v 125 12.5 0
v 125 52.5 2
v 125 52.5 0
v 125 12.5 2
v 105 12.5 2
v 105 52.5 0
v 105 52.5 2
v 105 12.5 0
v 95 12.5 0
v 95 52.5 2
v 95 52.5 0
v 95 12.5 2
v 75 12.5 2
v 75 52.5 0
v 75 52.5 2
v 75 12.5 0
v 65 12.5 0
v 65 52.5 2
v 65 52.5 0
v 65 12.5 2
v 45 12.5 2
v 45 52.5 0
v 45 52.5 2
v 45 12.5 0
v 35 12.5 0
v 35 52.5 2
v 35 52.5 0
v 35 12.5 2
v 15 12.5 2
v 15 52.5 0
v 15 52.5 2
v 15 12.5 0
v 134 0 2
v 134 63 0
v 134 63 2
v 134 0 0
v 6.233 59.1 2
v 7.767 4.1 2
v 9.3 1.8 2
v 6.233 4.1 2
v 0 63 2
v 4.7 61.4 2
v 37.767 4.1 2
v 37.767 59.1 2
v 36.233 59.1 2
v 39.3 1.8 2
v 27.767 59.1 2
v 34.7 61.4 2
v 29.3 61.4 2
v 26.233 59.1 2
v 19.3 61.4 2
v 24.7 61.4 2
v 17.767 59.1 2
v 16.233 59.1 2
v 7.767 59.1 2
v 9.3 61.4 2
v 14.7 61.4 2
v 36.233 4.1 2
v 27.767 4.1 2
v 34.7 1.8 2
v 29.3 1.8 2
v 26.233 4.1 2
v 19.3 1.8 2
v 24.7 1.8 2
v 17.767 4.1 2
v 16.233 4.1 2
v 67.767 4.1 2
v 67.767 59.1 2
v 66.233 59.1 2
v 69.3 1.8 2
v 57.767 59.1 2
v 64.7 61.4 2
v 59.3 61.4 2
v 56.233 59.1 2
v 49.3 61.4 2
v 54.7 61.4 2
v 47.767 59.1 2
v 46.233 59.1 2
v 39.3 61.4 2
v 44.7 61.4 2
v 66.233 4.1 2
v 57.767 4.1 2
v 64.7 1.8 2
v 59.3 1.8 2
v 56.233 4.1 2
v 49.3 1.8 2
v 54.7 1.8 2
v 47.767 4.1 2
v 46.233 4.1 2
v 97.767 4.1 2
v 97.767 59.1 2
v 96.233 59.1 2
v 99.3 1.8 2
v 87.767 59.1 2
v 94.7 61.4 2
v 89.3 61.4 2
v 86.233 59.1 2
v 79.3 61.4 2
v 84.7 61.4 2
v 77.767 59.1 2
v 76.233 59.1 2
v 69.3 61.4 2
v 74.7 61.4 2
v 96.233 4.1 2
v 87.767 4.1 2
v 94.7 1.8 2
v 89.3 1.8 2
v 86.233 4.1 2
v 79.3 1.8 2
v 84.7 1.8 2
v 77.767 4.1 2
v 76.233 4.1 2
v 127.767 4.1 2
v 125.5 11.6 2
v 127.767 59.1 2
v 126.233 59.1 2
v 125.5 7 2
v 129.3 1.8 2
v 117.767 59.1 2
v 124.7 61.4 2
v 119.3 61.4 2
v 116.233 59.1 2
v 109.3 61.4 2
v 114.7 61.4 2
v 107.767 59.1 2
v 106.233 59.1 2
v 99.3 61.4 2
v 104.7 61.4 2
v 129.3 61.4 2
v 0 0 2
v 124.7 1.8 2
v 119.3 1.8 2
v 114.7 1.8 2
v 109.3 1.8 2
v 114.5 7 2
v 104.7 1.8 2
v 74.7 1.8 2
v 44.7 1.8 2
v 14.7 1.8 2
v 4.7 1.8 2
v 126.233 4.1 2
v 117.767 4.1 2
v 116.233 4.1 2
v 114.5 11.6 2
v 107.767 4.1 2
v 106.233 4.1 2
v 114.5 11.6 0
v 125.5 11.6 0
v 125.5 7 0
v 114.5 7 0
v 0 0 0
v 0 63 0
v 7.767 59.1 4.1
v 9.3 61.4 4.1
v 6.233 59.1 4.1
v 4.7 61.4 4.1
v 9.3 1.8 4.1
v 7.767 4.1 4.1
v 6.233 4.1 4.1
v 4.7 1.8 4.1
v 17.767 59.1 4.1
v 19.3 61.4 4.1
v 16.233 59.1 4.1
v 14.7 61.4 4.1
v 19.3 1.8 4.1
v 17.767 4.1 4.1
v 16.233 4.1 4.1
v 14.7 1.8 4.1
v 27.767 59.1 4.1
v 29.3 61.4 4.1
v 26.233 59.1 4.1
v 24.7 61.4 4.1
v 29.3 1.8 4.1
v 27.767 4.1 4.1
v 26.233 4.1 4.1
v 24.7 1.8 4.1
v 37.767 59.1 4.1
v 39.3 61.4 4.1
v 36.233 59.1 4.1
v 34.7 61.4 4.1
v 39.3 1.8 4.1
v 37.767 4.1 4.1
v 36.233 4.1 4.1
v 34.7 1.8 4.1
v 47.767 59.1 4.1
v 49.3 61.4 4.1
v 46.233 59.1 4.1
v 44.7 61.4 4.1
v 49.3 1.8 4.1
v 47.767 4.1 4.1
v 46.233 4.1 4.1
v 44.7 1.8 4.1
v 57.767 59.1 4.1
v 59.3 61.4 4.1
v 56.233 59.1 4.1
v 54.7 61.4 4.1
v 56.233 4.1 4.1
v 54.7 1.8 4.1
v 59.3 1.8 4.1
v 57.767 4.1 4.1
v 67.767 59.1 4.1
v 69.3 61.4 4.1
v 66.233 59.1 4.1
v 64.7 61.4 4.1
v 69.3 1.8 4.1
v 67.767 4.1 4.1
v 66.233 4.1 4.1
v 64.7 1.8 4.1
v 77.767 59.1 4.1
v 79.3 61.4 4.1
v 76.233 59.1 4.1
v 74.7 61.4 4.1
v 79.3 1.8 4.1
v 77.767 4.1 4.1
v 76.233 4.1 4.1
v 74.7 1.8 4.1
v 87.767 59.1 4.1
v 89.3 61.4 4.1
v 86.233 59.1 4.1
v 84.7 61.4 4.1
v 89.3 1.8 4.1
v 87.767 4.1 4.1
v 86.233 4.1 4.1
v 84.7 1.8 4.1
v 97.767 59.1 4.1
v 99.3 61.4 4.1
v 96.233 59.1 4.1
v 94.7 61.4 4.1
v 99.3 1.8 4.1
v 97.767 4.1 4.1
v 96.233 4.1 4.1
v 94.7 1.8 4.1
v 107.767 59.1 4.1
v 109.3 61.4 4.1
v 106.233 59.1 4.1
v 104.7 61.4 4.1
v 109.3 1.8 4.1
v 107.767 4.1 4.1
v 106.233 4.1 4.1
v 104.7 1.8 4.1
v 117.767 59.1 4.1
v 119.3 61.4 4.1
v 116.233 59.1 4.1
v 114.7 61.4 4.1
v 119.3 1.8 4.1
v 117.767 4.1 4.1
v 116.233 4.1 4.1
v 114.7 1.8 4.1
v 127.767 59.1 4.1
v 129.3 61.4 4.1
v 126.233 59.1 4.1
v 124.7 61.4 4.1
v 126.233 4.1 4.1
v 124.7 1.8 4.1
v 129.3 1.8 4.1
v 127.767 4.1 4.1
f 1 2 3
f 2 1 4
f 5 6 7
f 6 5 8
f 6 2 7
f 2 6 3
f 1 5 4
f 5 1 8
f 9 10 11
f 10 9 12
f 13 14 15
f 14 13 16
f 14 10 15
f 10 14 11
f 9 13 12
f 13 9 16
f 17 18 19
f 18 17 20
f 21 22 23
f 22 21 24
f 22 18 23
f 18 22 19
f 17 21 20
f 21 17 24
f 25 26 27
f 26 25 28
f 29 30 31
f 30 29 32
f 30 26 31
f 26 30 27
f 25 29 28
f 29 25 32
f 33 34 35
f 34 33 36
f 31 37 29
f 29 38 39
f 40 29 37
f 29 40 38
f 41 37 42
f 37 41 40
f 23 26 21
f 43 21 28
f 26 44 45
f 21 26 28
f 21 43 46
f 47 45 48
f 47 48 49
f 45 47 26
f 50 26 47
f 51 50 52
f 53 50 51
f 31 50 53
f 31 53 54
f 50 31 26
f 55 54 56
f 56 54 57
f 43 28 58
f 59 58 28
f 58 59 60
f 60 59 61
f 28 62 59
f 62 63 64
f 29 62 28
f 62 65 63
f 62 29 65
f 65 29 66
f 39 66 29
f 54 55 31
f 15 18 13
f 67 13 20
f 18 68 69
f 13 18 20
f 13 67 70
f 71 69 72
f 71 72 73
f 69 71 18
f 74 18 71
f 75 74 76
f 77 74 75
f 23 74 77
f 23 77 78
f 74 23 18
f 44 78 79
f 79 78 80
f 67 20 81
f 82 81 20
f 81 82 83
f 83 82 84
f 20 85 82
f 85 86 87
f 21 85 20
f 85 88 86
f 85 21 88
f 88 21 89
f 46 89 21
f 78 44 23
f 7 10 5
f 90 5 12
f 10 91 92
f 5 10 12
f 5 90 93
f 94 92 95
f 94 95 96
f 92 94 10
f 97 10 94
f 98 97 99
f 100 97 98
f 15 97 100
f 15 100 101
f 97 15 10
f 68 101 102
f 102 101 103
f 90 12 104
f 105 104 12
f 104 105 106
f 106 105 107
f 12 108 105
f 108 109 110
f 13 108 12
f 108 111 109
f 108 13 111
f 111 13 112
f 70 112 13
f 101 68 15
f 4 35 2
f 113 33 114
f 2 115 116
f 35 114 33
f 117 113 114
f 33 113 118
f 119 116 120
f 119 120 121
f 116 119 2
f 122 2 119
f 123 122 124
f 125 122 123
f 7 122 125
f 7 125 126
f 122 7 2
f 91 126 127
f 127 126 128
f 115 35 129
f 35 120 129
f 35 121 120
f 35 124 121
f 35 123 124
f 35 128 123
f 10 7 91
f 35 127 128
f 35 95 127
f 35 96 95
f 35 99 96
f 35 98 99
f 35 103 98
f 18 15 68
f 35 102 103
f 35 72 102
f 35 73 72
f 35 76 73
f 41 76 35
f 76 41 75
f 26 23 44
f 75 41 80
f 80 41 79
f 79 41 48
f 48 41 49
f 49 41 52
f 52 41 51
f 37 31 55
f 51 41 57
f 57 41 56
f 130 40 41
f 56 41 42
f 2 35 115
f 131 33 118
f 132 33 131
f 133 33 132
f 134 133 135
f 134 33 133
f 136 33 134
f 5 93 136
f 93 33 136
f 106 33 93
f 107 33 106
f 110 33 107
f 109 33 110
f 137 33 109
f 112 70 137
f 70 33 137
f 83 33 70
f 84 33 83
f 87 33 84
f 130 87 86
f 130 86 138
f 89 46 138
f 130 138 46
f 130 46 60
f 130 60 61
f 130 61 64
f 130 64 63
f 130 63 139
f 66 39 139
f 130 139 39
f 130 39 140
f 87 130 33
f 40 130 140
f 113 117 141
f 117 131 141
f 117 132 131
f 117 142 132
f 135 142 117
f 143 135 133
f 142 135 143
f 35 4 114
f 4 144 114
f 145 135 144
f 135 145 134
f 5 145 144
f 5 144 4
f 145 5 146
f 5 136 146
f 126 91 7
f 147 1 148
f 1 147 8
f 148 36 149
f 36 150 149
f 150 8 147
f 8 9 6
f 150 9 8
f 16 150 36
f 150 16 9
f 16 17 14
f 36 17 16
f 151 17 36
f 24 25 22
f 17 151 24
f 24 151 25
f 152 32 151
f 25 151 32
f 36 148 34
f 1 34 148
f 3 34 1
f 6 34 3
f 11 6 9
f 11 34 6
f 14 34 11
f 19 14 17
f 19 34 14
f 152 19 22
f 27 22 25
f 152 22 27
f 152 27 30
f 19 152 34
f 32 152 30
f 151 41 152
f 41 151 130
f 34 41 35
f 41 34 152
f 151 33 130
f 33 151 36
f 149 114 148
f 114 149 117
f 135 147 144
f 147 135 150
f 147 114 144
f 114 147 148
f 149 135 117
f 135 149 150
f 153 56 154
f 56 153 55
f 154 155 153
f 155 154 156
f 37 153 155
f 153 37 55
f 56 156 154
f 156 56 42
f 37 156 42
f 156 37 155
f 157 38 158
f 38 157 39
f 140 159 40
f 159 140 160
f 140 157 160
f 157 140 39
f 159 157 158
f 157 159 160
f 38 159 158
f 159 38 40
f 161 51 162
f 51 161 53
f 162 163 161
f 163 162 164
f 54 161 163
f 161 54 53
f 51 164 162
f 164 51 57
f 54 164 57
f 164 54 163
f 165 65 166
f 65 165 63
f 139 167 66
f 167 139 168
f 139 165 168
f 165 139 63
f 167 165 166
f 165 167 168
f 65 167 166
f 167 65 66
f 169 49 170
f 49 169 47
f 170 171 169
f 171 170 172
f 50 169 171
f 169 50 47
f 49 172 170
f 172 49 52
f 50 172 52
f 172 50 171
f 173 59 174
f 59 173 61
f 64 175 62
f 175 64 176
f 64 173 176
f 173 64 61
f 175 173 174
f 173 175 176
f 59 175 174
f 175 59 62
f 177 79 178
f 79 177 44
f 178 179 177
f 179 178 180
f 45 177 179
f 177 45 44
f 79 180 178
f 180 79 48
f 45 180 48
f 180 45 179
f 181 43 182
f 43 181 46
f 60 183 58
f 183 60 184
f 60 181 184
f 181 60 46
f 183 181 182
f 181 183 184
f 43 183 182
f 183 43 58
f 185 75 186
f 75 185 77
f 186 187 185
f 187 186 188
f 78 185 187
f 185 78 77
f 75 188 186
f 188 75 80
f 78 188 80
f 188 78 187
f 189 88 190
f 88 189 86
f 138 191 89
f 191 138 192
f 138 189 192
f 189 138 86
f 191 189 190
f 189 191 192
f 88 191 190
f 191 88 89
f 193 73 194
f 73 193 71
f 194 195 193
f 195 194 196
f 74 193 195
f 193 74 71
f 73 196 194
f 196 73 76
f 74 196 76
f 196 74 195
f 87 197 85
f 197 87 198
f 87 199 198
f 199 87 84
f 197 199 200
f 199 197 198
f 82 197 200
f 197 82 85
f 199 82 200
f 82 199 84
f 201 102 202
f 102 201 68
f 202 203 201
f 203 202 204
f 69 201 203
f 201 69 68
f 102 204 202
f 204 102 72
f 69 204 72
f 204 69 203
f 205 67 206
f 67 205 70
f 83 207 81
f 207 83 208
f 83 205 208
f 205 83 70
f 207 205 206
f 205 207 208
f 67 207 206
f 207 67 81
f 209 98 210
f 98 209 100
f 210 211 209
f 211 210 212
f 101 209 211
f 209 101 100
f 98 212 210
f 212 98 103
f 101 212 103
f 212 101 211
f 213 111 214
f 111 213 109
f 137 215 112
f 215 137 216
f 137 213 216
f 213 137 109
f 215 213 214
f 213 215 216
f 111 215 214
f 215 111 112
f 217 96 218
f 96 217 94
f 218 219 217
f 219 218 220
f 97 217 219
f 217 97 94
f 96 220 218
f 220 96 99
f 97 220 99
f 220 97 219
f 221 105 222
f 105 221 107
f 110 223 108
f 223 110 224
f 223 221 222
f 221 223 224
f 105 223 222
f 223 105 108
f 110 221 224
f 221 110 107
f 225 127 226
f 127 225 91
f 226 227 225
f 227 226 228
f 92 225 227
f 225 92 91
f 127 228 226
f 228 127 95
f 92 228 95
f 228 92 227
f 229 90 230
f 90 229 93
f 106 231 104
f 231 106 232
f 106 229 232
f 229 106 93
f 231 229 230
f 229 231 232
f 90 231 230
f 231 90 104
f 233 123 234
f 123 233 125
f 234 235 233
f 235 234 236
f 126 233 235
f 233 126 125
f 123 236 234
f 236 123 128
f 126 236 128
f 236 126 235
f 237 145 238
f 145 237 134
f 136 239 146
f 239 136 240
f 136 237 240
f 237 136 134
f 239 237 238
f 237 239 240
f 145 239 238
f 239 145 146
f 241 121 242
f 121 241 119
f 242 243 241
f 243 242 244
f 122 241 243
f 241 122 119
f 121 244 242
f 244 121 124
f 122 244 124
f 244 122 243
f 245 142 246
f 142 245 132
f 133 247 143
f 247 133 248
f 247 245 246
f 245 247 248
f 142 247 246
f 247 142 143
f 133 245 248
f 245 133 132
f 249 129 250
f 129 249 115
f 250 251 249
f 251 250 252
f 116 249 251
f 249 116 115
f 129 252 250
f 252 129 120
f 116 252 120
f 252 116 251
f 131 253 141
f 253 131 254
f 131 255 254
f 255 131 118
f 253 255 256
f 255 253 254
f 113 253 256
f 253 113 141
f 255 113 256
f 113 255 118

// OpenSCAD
// file: display_spacer.scad
include <common.scad>
include <display_config.scad>
use <display.scad>
include <generic_board.scad>
include <dovetail.scad>
include <display_support_config.scad>

module display_spacer() {
    $fn=50;
    difference() {
        cylinder(display_support_spacing, d=bigscrew_head_diameter);
        translate([0,0,-margin/2]) cylinder(display_support_spacing+margin, d=bigscrew_diameter);
    }
}

display_spacer();
// file: generic_board.scad
include <dovetail.scad>;
include <board_config.scad>;
include <common.scad>;


hole_spacing=10;
front_back_holes_depth=10;

module generic_board_attacher_mating() {
    difference() {
        cube([board_attacher_width,board_attacher_length,board_attacher_height]);
        // non attaching holes
        
        for (z=[1:board_attacher_height/(hole_spacing/2)-1]) translate([0,0,hole_spacing/2*z]) union() {
            /*for (i=[1:board_attacher_length/hole_spacing-1]) 
                translate([-margin,hole_spacing*i,0]) rotate([0,90,0]) 
                    cylinder(board_attacher_width+2*margin,d=bigscrew_diameter, $fn=50);*/
            for (i=[1:board_attacher_length/(hole_spacing/2)]) 
                translate([-margin,hole_spacing*i/2-hole_spacing/4,0]) rotate([0,90,0]) 
                    cylinder(board_attacher_width+2*margin,d=bigscrew_attach_hole_diameter, $fn=50);                
        }
        // vertical attaching holes
        for (i=[1:board_attacher_height/(hole_spacing/2)-1]) 
            union() {
                translate([board_attacher_width/2,front_back_holes_depth+margin,hole_spacing*i/2]) rotate([90,00,0]) 
                    cylinder(front_back_holes_depth+2*margin,d=bigscrew_attach_hole_diameter, $fn=50);             
                translate([board_attacher_width/2,board_attacher_length+margin,hole_spacing*i/2]) rotate([90,00,0]) 
                    cylinder(front_back_holes_depth+2*margin,d=bigscrew_attach_hole_diameter, $fn=50);             
            }
                
    }
}

module generic_board_attacher() {
    union() {
        generic_board_attacher_mating();
        translate([board_attacher_width/2,board_attacher_length,0]) rail(true, rail_width, rail_height, board_attacher_length);  
        translate([board_attacher_width/2,board_attacher_length,board_attacher_height]) rotate([0,180,0]) rail(true, rail_width, rail_height, board_attacher_length);  
    }
}

//generic_board_attacher();
// file: display.scad
include <display_config.scad>

module display_holes_row() {
    $fn=50;
    translate([display_hole_x_offset,display_hole_y_offset,-cut_limit]) cylinder(h=20,d=display_hole_size);
    translate([display_hole_x_offset,display_pcb_height-display_hole_y_offset,-cut_limit]) cylinder(h=20,d=display_hole_size);
}


module ghost_display() {
    $fn=50;
    module fakePCB() {        
        difference() {
            color([0,1.0,0]) cube([display_pcb_width,display_pcb_height, 2.00]);
            display_holes_row();
            translate([display_hole_between,0,0]) display_holes_row();
        }
    }
    
    module fakeDisplay() {
        cube([display_screen_width, display_screen_height,6.00]);
    }
    
    module fakePot() {  // Reference X is middle
        translate([-display_pot_side/2, -display_pot_side/2,0]) union() { 
        color([0,0,1.0]) cube([display_pot_side, display_pot_side, display_pot_height]);
        translate([display_pot_side/2, display_pot_side/2, display_pot_height]) cylinder(10, d=6);
        color([0,0,0,0.3]) translate([display_pot_side/2, display_pot_side/2, 12]) cylinder(10, d=25);
    }
    }

    switch_side=6;
    switch_height=4;
    bite_height=4;
    switch_round_diameter=3;
    module fakeSwitch() { // Reference X middle
        translate([-switch_side/2, 0 ,0]) union() { 
            color([0.4,0.4,0.4]) cube([switch_side,switch_side, switch_height]);
            color([0,0,0]) translate([switch_side/2, switch_side/2, switch_height]) cylinder(bite_height,d=switch_round_diameter);
    }
    }

    connector_height=9;
    module connector() {
        difference() {
            cube([21,connector_height,9]);
            translate([1,1,1+cut_limit*2]) cube([19,7,8+cut_limit]); // middle
            translate([8,-cut_limit,1+cut_limit*2])cube([5,2+cut_limit,9]); // notch
        }
    }

    sd_height=27;
    module sdCardSlot() {
        cube([17 ,27 ,3]);
    }
    
    fakePCB();
    translate([display_x_shift, display_y_shift,2.0]) fakeDisplay();
    translate([display_pot_x_shift,display_pot_y_shift, 2.0]) fakePot();
    translate([display_switch_x_shift, display_switch_y_shift,2.0]) fakeSwitch();
    translate([49,connector_height+9,0]) rotate([180,0,0]) connector();
    translate([49+21,connector_height+9,0]) rotate([180,0,0]) connector();
    translate([0,sd_height+8,0]) rotate([180,0,0]) sdCardSlot();
}


ghost_display();
// file: pico_config.scad
pico_width = 51;
pico_height=21;
pico_thickness=2;
pico_screw_from_width=2;
pico_screw_from_height=4.8;
margin=0.1;
pico_screw_hole=2.1;
usb_height=8;
usb_protrude=1.3;
usb_width=5.5;
usb_thickness=2.3;

pico_holes=[
    [pico_screw_from_width, pico_screw_from_height],
    [pico_screw_from_width, pico_height-pico_screw_from_height],
    [pico_width-pico_screw_from_width,pico_screw_from_height],
    [pico_width-pico_screw_from_width,pico_height-pico_screw_from_height]
];
// file: support_display.scad
include <common.scad>
include <display_config.scad>
use <display.scad>
include <generic_board.scad>
include <dovetail.scad>
include <display_support_config.scad>
use <display_spacer.scad>

module support_display(ghost=false) {
    $fn=50;
    if (ghost) {
        translate([-display_support_shift_x,-display_support_spacing,display_support_screen_height]) rotate([90,0,0]) ghost_display();
    for (i=[0:3]) 
          translate([display_holes[i][0]-display_support_shift_x,0,display_holes[i][1]+display_support_screen_height]) 
            rotate([90,0,0]) display_spacer();    
    }
    //generic_board_attacher();
    difference() {
        cube([display_pcb_width-display_support_shift_x,display_support_thickness,board_attacher_height]);
        translate([-1,-margin/2,12]) cube([100-display_support_shift_x,50,32]);       
        for (i=[0:3]) 
          translate([display_holes[i][0]-display_support_shift_x,margin+display_support_spacing,display_holes[i][1]+display_support_screen_height]) 
            rotate([90,0,0]) cylinder(20,d=3);
    }
    
    translate([0,display_support_thickness/2,0]) rotate([0,0,90]) rail(true, rail_width, rail_height, display_pcb_width-display_support_shift_x); 
    translate([0,display_support_thickness/2,board_attacher_height]) rotate([0,180,90]) rail(true, rail_width, rail_height, display_pcb_width-display_support_shift_x);  
}

translate([0,0,display_pcb_width-remove_side]) rotate([0,90,0]) support_display(true);
// file: common.scad
inch_to_mm = 25.4;

margin=0.1;
bigscrew_attach_hole_diameter= 2.44;
bigscrew_diameter = 2.54;
bigscrew_head_diameter = 5;
bigscrew_head_height = 2.1;
// file: midiboard_ada_config.scad
include <common.scad>;
midi_board_width = 2*inch_to_mm;
midi_board_height = 0.9*inch_to_mm;
midi_board_depth = 1.62;
midi_board_hole_diameter = 2.54;
midi_board_hole_from_side = 0.05*inch_to_mm + midi_board_hole_diameter/2;
midi_board_underclearance = 4.24; // For the optocoupler
midi_support_board_height=1;
midi_support_thickness=4;
midi_support_spacing=midi_board_underclearance;


midi_board_holes = [
   [midi_board_hole_from_side, midi_board_hole_from_side],
   [midi_board_width-midi_board_hole_from_side, midi_board_hole_from_side],
   [midi_board_hole_from_side, midi_board_height-midi_board_hole_from_side],
   [midi_board_width-midi_board_hole_from_side, midi_board_height-midi_board_hole_from_side]
];
// file: display_support_config.scad
display_support_thickness=3;
display_support_spacing = 3.6;
display_support_screen_height=5;
display_support_shift_x=5;
// file: display_config.scad
display_pcb_height=47;
display_pcb_width=105;
display_hole_size= 3.0;
cut_limit = 1.0;

display_hole_x_offset=9;
display_hole_y_offset=3;
display_hole_between=93;

display_screen_width=57.19;
display_screen_height=37.79;
display_x_shift=13;
display_y_shift = display_pcb_height-display_screen_height-4.0;
display_holes=[[display_hole_x_offset, display_hole_y_offset],
               [display_hole_x_offset, display_pcb_height-display_hole_y_offset],
               [display_hole_between+display_hole_x_offset, display_hole_y_offset],
               [display_hole_between+display_hole_x_offset, display_pcb_height-display_hole_y_offset]];
               
display_pot_side=12;
display_pot_height=7;

display_pot_x_shift = 92.2;
display_pot_y_shift = display_pcb_height-20.66;


display_switch_x_shift= display_pot_x_shift;
display_switch_y_shift = 8.85;
// file: board_config.scad
rail_position=20;
rail_height=2.5;
rail_width=5;
mainboard_width=60;
mainboard_height=130;
mainboard_thickness=4;
mainboard_spacing=10;
deep_holes_spacing=10;
rails=4;


board_attacher_width=4;
board_attacher_height=55;
board_attacher_length=30;

side_panel_height = board_attacher_height + 2*mainboard_thickness;
side_panel_thickness=2;
side_panel_ticks=2;

front_panel_height = board_attacher_height + 2*mainboard_thickness;
front_panel_thickness=2;
front_panel_ticks=2;
front_panel_width = mainboard_height + 2*side_panel_thickness;
// file: dovetail.scad
module dovetail_shape(width, height, length) {
    translate([-width/2,0,0]) linear_extrude(height = length) {
        polygon([[0, 0], [width, 0], [width - width/3, height], [width/3, height]]);
    }
}

module rail(male=false, width, height, length, default_offset=0.2) {
    // male will reduce the width slightly
    offset = male ? default_offset : 0;
    
    translate([0,0,-height+offset]) rotate([90,0,0]) dovetail_shape(width-2*offset,height-offset,length);
}
// main file
include <dovetail.scad>
include <board_config.scad>
include <display_config.scad>
include <display_support_config.scad>
include <midiboard_ada_config.scad>
include <common.scad>
use <support_display.scad>
include <pico_config.scad>

midi_cut_width=20;
midi_cut_height=40;
usb_x=8.5;
usb_y=7;
midi_x=9;
midi_y=12.5;
midi_shift_x=30;
module back_panel() {

    $fn=50;
    union() {
        difference(){
            cube([front_panel_width,front_panel_height,front_panel_thickness]);
            translate([front_panel_width-usb_x-usb_width*2,usb_y,-margin/2]) cube([usb_width*2,usb_thickness*2,front_panel_thickness+margin]);
            for (i=[0:3])
                translate([front_panel_width-midi_cut_width-midi_shift_x*i-midi_x, midi_y,-margin/2]) cube([midi_cut_width,midi_cut_height,front_panel_thickness+margin]);
        }
        // rails h
        for (i=[1:mainboard_height/mainboard_spacing])
            union() {
                translate([i*mainboard_spacing-mainboard_spacing/2+side_panel_thickness,front_panel_height-mainboard_thickness+margin,margin]) rotate([90,180,0]) rail(true, rail_width, rail_height, front_panel_thickness+front_panel_ticks);
                translate([i*mainboard_spacing-mainboard_spacing/2+side_panel_thickness,mainboard_thickness+margin,margin]) rotate([90,180,180]) rail(true, rail_width, rail_height, front_panel_thickness+front_panel_ticks);
            }
        
    }
}

color("orange") back_panel();
